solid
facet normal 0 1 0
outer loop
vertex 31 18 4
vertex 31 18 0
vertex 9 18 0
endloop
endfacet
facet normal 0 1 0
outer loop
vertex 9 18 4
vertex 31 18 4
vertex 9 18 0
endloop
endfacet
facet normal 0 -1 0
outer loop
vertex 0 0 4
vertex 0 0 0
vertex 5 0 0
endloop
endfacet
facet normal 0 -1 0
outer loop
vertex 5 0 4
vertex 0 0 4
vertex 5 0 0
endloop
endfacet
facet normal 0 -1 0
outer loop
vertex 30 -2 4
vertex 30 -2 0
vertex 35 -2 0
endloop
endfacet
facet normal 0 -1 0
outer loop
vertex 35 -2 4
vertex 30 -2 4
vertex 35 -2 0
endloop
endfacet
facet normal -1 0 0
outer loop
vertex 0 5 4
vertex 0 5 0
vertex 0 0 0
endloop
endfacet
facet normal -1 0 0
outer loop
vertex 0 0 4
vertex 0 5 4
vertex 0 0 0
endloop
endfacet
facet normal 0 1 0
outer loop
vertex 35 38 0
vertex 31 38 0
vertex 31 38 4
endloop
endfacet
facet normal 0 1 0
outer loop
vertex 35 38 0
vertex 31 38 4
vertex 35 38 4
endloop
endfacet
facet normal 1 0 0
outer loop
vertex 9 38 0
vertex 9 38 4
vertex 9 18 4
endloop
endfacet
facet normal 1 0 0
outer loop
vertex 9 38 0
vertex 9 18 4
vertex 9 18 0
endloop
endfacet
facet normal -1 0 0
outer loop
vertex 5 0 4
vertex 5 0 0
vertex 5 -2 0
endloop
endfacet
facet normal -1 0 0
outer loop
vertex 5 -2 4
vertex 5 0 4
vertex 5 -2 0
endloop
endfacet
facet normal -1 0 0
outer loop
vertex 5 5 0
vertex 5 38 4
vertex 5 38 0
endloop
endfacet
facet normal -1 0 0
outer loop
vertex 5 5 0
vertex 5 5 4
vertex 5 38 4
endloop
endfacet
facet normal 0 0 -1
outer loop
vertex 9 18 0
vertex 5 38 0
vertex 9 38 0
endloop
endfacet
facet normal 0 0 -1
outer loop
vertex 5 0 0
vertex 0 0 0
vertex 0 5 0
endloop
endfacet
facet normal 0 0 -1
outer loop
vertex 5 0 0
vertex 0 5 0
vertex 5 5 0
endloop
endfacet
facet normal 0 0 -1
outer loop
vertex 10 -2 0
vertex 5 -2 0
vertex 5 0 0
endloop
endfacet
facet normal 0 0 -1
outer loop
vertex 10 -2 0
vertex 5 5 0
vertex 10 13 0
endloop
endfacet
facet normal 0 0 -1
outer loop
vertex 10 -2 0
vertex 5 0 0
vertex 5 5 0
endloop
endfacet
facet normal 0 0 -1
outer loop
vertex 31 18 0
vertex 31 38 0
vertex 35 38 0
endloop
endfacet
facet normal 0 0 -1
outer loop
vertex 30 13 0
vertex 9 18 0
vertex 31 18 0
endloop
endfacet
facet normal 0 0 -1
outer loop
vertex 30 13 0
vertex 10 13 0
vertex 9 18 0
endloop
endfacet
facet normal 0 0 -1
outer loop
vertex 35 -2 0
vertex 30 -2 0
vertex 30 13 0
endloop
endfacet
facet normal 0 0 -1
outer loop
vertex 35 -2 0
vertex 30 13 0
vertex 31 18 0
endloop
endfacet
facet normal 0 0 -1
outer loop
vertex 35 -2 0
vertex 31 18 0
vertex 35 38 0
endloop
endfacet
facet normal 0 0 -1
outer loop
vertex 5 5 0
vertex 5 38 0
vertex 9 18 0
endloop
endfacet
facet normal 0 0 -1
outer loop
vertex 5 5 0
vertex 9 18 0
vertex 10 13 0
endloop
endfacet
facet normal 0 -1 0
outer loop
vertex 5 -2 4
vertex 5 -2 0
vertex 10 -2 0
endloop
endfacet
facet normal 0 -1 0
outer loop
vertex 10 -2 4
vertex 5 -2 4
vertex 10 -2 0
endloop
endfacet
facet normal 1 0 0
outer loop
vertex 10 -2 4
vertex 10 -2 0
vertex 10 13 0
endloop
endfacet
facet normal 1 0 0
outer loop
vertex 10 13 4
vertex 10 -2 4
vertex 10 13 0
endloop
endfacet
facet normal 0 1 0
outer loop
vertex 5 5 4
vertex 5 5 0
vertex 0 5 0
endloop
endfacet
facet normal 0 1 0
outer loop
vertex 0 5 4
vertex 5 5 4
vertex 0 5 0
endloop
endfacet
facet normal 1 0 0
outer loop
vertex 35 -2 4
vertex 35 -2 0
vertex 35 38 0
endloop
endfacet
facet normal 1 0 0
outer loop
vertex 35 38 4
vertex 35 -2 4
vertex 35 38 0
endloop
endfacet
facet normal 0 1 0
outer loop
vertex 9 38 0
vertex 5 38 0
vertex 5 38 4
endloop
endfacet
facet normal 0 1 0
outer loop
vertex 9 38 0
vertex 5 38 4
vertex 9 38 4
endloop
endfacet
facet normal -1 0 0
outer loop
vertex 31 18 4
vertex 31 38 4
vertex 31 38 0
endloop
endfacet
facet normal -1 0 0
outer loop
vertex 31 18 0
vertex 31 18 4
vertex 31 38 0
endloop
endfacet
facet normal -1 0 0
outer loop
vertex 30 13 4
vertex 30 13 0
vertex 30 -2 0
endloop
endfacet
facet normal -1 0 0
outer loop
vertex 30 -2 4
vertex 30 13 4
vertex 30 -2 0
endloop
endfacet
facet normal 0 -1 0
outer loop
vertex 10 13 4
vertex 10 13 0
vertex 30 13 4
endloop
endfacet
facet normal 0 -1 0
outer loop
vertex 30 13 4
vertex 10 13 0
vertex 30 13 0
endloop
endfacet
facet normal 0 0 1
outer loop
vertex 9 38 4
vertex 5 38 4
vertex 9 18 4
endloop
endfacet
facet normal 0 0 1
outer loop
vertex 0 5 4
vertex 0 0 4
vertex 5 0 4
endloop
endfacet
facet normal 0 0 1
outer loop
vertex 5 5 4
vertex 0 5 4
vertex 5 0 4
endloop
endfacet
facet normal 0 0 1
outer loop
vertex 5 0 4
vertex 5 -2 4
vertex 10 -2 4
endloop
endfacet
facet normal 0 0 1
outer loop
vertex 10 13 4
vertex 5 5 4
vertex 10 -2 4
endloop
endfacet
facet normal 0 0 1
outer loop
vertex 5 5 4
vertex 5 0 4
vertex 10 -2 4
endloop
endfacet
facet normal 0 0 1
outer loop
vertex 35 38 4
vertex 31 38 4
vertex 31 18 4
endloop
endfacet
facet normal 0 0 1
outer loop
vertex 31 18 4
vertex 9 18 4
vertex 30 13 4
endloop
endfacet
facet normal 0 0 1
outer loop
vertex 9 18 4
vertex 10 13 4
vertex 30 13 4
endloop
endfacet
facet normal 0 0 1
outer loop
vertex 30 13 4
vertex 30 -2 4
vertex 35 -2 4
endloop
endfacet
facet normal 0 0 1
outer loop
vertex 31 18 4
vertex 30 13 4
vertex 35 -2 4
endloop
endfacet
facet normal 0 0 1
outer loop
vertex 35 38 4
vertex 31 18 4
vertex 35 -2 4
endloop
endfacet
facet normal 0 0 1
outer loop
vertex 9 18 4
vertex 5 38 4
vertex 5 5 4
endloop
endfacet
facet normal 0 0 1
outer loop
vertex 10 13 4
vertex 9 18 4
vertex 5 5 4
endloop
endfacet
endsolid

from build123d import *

# Parameters (mm, degrees)
P_IDAT_VYSUNUT_M1_DEPTH  = 4
SKICA2_W                 = 20
SKICA2_H                 = 4
P_IDAT_VYSUNUT_M2_DEPTH  = 15
SKICA3_W                 = 5.5
SKICA3_H                 = 3
ODEBRAT_VYSUNUT_M1_DEPTH = 15
SKICA4_W                 = 20
SKICA4_H                 = 15
ODEBRAT_VYSUNUT_M2_DEPTH = 15
SKICA5_W                 = 4
SKICA5_H                 = 4
P_IDAT_VYSUNUT_M3_DEPTH  = 20


with BuildPart() as part:
    # Skica1 → Přidat vysunutím1 (new body)
    with BuildSketch(Plane.XY):
        Polygon((0, 0), (5, 0), (5, -2), (10, -2), (10, 4.082474227), (10, 13), (30, 13), (30, -2), (35, -2), (35, 18), (5, 18), (5, 5), (0, 5), align=None)
    extrude(amount=P_IDAT_VYSUNUT_M1_DEPTH)

    # Skica2 → Přidat vysunutím2 (add)
    with BuildSketch(Plane(origin=(0, 18, 0), x_dir=(1, 0, 0), z_dir=(0, 1, 0))):
        with Locations((20, -2)):
            Rectangle(SKICA2_W, SKICA2_H)
    extrude(amount=P_IDAT_VYSUNUT_M2_DEPTH)

    # Skica3 → Odebrat vysunutím1 (cut)
    with BuildSketch(Plane.XY.offset(4)):
        with Locations((20, 28)):
            Rectangle(SKICA3_W, SKICA3_H)
    extrude(amount=-ODEBRAT_VYSUNUT_M1_DEPTH, mode=Mode.SUBTRACT)

    # Skica4 → Odebrat vysunutím2 (cut)
    with BuildSketch(Plane.XY.offset(4)):
        with Locations((20, 25.5)):
            Rectangle(SKICA4_W, SKICA4_H)
    extrude(amount=-ODEBRAT_VYSUNUT_M2_DEPTH, mode=Mode.SUBTRACT)

    # Skica5 → Přidat vysunutím3 (add)
    with BuildSketch(Plane(origin=(0, 18, 0), x_dir=(1, 0, 0), z_dir=(0, 1, 0))):
        with Locations((7, -2)):
            Rectangle(SKICA5_W, SKICA5_H)
        with Locations((33, -2)):
            Rectangle(SKICA5_W, SKICA5_H)
    extrude(amount=P_IDAT_VYSUNUT_M3_DEPTH)


solid = part.part
